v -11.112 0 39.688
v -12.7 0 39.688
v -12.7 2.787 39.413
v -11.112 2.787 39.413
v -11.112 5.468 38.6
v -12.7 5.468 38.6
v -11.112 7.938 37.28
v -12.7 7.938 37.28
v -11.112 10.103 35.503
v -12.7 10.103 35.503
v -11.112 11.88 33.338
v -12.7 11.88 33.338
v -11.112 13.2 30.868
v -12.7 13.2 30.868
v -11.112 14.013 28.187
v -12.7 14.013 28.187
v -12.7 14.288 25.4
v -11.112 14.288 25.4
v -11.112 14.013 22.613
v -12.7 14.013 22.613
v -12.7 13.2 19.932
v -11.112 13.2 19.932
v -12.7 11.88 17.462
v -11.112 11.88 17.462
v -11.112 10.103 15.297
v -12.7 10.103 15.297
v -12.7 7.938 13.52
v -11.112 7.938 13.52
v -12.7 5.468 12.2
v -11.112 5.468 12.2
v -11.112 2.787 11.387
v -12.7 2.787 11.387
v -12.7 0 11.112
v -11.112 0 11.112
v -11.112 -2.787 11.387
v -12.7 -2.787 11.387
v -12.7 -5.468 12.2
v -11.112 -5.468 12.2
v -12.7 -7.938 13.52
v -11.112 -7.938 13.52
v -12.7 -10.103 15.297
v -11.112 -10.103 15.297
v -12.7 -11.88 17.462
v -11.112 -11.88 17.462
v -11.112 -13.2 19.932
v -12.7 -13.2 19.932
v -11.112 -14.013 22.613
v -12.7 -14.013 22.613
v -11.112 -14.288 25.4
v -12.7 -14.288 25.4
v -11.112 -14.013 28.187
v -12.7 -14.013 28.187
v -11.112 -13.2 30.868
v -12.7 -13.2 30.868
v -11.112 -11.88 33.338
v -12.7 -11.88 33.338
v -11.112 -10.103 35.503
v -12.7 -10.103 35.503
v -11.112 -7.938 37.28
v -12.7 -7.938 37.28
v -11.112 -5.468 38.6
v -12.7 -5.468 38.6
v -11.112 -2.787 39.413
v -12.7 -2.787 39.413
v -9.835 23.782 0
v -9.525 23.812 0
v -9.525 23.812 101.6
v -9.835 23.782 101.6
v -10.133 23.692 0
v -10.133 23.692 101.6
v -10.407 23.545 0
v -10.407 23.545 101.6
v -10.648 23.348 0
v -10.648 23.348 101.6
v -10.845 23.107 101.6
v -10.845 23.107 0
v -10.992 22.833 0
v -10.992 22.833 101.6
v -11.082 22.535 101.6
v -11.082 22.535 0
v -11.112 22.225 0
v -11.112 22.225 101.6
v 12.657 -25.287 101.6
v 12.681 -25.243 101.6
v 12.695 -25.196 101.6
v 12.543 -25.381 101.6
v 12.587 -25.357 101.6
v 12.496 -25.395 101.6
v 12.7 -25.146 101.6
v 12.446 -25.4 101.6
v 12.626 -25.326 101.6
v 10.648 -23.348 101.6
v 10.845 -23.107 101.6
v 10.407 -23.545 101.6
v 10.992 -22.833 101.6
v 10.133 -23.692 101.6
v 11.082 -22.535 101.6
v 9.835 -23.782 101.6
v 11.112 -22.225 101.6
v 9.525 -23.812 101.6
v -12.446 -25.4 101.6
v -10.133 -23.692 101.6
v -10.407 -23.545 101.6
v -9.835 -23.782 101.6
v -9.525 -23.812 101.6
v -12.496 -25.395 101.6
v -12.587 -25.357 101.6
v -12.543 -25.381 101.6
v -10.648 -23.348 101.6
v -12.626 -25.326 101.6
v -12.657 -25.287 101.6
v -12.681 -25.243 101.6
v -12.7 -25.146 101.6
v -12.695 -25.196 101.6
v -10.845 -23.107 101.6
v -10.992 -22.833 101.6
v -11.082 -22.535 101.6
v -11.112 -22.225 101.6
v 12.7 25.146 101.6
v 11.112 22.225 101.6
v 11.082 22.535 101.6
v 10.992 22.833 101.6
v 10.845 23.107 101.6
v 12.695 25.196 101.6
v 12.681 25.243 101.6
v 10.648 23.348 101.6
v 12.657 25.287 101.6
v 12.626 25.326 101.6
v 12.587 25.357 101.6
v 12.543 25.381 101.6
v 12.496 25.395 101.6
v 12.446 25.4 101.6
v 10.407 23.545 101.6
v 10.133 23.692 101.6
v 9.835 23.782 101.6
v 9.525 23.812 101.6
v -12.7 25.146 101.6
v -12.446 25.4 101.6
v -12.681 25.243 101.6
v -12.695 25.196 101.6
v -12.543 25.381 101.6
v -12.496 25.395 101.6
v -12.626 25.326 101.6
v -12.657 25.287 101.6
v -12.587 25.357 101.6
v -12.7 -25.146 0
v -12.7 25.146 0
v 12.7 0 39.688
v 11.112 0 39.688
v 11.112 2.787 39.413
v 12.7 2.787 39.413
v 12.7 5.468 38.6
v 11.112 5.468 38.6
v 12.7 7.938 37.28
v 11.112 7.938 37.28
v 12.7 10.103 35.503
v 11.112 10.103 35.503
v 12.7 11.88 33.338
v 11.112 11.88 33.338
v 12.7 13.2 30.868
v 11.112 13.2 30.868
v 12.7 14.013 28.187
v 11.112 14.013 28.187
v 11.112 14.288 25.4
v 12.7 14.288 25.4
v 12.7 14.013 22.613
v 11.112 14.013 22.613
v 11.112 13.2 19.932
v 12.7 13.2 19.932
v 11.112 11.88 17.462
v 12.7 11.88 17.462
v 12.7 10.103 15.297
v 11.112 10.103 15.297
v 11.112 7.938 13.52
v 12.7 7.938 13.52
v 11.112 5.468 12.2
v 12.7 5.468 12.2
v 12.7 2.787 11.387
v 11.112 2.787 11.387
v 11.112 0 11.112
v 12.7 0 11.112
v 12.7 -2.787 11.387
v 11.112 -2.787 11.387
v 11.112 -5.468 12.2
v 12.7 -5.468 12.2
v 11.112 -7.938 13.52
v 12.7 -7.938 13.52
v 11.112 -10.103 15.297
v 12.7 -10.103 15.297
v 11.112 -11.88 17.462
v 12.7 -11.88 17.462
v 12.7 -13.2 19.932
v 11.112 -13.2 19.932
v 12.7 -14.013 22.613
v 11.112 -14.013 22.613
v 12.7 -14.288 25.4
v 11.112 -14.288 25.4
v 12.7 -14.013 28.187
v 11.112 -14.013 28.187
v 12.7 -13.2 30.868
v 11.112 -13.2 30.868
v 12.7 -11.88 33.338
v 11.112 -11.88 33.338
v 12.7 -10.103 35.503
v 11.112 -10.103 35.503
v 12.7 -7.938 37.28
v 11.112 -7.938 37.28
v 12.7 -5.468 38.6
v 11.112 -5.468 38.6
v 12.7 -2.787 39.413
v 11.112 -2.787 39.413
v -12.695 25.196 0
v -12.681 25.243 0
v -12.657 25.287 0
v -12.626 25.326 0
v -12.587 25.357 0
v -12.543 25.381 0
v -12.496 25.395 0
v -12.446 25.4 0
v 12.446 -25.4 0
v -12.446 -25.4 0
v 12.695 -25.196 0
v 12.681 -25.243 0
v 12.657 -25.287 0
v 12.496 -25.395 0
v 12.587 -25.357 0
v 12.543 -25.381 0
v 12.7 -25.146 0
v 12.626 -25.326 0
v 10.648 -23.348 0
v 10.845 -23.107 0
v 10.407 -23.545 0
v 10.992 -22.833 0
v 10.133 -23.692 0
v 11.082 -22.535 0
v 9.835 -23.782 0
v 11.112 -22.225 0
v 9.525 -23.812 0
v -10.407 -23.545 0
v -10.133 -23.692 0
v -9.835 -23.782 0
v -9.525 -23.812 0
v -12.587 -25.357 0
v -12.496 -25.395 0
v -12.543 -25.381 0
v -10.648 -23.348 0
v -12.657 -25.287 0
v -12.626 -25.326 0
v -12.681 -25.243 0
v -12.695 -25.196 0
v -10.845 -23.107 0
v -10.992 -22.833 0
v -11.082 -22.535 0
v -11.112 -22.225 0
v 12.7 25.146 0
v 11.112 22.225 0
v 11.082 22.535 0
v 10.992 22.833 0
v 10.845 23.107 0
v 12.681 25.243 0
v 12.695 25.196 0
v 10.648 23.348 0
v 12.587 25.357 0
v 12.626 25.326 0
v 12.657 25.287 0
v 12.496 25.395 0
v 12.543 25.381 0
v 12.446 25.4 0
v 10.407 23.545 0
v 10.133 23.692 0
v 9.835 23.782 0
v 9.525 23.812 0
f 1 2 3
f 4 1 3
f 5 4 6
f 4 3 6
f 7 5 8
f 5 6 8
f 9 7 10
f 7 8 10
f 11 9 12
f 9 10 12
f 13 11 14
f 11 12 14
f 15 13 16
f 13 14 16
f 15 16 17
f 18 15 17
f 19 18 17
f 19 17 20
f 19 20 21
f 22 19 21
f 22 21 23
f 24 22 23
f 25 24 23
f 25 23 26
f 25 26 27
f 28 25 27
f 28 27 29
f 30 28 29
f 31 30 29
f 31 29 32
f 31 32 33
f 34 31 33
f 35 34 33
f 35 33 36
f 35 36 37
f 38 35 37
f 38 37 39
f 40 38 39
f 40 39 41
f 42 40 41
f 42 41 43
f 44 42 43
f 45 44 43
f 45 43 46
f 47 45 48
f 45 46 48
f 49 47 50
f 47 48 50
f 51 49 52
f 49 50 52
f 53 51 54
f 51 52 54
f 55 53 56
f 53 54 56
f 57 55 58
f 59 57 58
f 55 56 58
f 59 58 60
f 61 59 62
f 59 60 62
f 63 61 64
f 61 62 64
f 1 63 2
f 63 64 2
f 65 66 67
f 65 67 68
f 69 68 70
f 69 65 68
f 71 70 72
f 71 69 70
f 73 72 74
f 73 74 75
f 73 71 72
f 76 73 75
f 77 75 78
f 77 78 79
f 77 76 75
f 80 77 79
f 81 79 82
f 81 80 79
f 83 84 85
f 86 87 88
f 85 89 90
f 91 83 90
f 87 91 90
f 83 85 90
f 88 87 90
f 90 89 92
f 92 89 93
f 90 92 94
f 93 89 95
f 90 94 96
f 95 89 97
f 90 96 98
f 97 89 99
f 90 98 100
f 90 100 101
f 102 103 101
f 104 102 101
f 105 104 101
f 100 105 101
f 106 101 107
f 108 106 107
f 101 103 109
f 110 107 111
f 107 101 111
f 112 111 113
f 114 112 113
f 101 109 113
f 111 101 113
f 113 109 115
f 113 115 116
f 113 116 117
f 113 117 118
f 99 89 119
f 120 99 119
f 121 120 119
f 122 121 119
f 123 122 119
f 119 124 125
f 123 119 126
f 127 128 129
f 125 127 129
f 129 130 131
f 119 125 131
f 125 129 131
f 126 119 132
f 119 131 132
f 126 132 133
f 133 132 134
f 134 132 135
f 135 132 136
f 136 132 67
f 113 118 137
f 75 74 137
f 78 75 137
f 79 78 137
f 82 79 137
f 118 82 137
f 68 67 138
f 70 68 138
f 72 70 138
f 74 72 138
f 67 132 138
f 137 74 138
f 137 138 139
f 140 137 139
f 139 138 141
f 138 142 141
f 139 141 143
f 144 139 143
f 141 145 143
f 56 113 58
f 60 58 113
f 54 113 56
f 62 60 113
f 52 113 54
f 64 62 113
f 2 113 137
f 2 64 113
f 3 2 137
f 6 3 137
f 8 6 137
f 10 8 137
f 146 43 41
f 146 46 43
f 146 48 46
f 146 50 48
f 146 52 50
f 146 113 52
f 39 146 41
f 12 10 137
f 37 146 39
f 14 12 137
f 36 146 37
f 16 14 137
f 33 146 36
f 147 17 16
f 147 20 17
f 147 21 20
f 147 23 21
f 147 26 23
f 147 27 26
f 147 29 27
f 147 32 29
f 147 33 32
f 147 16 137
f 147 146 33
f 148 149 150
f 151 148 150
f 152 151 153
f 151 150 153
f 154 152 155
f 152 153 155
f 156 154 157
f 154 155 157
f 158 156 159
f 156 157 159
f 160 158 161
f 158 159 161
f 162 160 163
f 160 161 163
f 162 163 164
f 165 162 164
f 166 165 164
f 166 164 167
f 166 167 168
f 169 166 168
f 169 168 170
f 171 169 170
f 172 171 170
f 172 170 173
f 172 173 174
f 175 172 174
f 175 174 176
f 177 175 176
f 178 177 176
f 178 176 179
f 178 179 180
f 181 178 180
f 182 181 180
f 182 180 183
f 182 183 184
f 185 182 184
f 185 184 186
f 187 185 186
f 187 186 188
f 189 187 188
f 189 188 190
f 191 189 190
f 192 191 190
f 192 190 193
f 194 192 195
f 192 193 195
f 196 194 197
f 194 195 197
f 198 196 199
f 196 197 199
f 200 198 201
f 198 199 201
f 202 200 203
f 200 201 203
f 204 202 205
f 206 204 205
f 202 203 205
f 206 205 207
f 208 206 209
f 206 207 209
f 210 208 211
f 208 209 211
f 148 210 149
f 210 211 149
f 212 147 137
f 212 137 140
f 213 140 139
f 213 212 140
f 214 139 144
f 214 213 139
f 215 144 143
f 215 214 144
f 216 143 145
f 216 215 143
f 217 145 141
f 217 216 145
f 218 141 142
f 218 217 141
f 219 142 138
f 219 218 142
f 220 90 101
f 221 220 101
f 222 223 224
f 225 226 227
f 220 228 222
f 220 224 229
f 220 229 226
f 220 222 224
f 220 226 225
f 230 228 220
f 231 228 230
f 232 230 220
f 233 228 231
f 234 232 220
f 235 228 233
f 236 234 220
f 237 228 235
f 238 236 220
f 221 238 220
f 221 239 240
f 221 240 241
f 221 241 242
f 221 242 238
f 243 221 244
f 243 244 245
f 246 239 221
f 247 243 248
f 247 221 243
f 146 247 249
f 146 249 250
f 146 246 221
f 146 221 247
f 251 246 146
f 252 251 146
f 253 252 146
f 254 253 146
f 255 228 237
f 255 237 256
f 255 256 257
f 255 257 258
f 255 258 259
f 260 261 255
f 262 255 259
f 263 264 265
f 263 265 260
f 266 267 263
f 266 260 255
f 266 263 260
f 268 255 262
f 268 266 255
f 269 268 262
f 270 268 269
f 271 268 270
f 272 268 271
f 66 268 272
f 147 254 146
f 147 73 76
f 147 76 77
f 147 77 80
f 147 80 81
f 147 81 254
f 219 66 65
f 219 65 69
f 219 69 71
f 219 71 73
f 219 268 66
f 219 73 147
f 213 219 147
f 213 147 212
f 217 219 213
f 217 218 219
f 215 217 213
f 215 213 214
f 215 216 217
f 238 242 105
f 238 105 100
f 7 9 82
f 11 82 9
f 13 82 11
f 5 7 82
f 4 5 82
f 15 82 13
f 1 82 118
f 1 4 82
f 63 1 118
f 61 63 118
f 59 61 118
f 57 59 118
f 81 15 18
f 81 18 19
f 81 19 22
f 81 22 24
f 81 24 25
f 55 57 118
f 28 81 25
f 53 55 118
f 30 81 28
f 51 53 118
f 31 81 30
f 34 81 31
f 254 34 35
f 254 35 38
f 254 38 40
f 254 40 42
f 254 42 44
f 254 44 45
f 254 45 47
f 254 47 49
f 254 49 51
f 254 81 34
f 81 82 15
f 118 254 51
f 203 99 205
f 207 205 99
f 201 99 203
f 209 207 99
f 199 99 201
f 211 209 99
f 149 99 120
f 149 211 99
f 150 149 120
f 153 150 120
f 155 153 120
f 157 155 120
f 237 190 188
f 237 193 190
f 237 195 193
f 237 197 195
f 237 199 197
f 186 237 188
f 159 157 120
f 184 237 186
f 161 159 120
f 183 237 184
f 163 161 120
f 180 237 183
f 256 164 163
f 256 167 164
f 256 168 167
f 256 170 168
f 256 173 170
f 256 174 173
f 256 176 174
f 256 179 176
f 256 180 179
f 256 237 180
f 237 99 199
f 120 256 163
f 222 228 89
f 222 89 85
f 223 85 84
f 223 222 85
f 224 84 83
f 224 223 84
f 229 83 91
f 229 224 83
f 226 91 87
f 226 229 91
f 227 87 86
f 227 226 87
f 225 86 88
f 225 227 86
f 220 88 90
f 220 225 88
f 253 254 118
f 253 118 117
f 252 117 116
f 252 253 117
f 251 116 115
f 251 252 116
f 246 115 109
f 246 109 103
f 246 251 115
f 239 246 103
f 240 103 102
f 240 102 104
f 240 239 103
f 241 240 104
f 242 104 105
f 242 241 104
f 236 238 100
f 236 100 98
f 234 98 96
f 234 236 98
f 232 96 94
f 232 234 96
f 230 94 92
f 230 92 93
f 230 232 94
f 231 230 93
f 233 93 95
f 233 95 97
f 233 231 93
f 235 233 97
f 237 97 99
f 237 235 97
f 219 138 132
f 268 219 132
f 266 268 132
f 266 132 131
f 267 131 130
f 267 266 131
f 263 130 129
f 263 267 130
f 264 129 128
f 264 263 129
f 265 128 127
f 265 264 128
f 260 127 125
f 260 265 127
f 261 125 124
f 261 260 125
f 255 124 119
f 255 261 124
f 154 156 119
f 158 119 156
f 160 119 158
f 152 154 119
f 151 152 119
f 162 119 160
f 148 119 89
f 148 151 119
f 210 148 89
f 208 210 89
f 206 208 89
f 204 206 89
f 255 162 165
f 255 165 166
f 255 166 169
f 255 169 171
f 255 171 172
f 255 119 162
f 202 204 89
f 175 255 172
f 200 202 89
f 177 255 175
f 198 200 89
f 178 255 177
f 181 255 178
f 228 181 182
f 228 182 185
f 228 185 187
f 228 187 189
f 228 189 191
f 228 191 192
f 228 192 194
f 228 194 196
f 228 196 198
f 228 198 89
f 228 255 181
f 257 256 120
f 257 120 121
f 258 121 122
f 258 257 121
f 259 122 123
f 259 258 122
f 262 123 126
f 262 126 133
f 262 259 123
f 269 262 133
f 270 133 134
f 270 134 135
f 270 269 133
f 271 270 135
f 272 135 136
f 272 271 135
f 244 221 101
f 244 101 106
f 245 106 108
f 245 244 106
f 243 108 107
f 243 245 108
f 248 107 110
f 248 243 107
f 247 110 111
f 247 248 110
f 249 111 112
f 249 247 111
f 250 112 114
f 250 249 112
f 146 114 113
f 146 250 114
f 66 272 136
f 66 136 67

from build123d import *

# Parameters (mm, degrees)
BOSS_EXTRUDE1_DEPTH = 101.6
SKETCH2_R           = 14.2875
CUT_EXTRUDE1_DEPTH  = 50.8


with BuildPart() as part:
    # Sketch1 → Boss-Extrude1 (new body)
    with BuildSketch(Plane(origin=(0, 0, 0), x_dir=(-1, 0, 0), z_dir=(0, 0, -1))):
        with BuildLine():
            Line((-12.7, 25.146), (-12.7, -25.146))
            ThreePointArc((-12.7, -25.146), (-12.625605122, -25.325605122), (-12.446, -25.4))
            Line((-12.446, -25.4), (12.446, -25.4))
            ThreePointArc((12.446, -25.4), (12.625605122, -25.325605122), (12.7, -25.146))
            Line((12.7, -25.146), (12.7, 25.146))
            ThreePointArc((12.7, 25.146), (12.625605122, 25.325605122), (12.446, 25.4))
            Line((12.446, 25.4), (-12.446, 25.4))
            ThreePointArc((-12.446, 25.4), (-12.625605122, 25.325605122), (-12.7, 25.146))
        make_face()
        with BuildLine():
            Line((-11.1125, -22.225), (-11.1125, 22.225))
            ThreePointArc((-11.1125, 22.225), (-10.647532015, 23.347532015), (-9.525, 23.8125))
            Line((-9.525, 23.8125), (9.525, 23.8125))
            ThreePointArc((9.525, 23.8125), (10.647532015, 23.347532015), (11.1125, 22.225))
            Line((11.1125, 22.225), (11.1125, -22.225))
            ThreePointArc((11.1125, -22.225), (10.647532015, -23.347532015), (9.525, -23.8125))
            Line((9.525, -23.8125), (-9.525, -23.8125))
            ThreePointArc((-9.525, -23.8125), (-10.647532015, -23.347532015), (-11.1125, -22.225))
        make_face(mode=Mode.SUBTRACT)
    extrude(amount=-BOSS_EXTRUDE1_DEPTH)

    # Sketch2 → Cut-Extrude1 (cut)
    with BuildSketch(Plane.ZY.offset(12.7)):
        with Locations((25.4, 0)):
            Circle(SKETCH2_R)
    extrude(amount=-CUT_EXTRUDE1_DEPTH, mode=Mode.SUBTRACT)


solid = part.part
